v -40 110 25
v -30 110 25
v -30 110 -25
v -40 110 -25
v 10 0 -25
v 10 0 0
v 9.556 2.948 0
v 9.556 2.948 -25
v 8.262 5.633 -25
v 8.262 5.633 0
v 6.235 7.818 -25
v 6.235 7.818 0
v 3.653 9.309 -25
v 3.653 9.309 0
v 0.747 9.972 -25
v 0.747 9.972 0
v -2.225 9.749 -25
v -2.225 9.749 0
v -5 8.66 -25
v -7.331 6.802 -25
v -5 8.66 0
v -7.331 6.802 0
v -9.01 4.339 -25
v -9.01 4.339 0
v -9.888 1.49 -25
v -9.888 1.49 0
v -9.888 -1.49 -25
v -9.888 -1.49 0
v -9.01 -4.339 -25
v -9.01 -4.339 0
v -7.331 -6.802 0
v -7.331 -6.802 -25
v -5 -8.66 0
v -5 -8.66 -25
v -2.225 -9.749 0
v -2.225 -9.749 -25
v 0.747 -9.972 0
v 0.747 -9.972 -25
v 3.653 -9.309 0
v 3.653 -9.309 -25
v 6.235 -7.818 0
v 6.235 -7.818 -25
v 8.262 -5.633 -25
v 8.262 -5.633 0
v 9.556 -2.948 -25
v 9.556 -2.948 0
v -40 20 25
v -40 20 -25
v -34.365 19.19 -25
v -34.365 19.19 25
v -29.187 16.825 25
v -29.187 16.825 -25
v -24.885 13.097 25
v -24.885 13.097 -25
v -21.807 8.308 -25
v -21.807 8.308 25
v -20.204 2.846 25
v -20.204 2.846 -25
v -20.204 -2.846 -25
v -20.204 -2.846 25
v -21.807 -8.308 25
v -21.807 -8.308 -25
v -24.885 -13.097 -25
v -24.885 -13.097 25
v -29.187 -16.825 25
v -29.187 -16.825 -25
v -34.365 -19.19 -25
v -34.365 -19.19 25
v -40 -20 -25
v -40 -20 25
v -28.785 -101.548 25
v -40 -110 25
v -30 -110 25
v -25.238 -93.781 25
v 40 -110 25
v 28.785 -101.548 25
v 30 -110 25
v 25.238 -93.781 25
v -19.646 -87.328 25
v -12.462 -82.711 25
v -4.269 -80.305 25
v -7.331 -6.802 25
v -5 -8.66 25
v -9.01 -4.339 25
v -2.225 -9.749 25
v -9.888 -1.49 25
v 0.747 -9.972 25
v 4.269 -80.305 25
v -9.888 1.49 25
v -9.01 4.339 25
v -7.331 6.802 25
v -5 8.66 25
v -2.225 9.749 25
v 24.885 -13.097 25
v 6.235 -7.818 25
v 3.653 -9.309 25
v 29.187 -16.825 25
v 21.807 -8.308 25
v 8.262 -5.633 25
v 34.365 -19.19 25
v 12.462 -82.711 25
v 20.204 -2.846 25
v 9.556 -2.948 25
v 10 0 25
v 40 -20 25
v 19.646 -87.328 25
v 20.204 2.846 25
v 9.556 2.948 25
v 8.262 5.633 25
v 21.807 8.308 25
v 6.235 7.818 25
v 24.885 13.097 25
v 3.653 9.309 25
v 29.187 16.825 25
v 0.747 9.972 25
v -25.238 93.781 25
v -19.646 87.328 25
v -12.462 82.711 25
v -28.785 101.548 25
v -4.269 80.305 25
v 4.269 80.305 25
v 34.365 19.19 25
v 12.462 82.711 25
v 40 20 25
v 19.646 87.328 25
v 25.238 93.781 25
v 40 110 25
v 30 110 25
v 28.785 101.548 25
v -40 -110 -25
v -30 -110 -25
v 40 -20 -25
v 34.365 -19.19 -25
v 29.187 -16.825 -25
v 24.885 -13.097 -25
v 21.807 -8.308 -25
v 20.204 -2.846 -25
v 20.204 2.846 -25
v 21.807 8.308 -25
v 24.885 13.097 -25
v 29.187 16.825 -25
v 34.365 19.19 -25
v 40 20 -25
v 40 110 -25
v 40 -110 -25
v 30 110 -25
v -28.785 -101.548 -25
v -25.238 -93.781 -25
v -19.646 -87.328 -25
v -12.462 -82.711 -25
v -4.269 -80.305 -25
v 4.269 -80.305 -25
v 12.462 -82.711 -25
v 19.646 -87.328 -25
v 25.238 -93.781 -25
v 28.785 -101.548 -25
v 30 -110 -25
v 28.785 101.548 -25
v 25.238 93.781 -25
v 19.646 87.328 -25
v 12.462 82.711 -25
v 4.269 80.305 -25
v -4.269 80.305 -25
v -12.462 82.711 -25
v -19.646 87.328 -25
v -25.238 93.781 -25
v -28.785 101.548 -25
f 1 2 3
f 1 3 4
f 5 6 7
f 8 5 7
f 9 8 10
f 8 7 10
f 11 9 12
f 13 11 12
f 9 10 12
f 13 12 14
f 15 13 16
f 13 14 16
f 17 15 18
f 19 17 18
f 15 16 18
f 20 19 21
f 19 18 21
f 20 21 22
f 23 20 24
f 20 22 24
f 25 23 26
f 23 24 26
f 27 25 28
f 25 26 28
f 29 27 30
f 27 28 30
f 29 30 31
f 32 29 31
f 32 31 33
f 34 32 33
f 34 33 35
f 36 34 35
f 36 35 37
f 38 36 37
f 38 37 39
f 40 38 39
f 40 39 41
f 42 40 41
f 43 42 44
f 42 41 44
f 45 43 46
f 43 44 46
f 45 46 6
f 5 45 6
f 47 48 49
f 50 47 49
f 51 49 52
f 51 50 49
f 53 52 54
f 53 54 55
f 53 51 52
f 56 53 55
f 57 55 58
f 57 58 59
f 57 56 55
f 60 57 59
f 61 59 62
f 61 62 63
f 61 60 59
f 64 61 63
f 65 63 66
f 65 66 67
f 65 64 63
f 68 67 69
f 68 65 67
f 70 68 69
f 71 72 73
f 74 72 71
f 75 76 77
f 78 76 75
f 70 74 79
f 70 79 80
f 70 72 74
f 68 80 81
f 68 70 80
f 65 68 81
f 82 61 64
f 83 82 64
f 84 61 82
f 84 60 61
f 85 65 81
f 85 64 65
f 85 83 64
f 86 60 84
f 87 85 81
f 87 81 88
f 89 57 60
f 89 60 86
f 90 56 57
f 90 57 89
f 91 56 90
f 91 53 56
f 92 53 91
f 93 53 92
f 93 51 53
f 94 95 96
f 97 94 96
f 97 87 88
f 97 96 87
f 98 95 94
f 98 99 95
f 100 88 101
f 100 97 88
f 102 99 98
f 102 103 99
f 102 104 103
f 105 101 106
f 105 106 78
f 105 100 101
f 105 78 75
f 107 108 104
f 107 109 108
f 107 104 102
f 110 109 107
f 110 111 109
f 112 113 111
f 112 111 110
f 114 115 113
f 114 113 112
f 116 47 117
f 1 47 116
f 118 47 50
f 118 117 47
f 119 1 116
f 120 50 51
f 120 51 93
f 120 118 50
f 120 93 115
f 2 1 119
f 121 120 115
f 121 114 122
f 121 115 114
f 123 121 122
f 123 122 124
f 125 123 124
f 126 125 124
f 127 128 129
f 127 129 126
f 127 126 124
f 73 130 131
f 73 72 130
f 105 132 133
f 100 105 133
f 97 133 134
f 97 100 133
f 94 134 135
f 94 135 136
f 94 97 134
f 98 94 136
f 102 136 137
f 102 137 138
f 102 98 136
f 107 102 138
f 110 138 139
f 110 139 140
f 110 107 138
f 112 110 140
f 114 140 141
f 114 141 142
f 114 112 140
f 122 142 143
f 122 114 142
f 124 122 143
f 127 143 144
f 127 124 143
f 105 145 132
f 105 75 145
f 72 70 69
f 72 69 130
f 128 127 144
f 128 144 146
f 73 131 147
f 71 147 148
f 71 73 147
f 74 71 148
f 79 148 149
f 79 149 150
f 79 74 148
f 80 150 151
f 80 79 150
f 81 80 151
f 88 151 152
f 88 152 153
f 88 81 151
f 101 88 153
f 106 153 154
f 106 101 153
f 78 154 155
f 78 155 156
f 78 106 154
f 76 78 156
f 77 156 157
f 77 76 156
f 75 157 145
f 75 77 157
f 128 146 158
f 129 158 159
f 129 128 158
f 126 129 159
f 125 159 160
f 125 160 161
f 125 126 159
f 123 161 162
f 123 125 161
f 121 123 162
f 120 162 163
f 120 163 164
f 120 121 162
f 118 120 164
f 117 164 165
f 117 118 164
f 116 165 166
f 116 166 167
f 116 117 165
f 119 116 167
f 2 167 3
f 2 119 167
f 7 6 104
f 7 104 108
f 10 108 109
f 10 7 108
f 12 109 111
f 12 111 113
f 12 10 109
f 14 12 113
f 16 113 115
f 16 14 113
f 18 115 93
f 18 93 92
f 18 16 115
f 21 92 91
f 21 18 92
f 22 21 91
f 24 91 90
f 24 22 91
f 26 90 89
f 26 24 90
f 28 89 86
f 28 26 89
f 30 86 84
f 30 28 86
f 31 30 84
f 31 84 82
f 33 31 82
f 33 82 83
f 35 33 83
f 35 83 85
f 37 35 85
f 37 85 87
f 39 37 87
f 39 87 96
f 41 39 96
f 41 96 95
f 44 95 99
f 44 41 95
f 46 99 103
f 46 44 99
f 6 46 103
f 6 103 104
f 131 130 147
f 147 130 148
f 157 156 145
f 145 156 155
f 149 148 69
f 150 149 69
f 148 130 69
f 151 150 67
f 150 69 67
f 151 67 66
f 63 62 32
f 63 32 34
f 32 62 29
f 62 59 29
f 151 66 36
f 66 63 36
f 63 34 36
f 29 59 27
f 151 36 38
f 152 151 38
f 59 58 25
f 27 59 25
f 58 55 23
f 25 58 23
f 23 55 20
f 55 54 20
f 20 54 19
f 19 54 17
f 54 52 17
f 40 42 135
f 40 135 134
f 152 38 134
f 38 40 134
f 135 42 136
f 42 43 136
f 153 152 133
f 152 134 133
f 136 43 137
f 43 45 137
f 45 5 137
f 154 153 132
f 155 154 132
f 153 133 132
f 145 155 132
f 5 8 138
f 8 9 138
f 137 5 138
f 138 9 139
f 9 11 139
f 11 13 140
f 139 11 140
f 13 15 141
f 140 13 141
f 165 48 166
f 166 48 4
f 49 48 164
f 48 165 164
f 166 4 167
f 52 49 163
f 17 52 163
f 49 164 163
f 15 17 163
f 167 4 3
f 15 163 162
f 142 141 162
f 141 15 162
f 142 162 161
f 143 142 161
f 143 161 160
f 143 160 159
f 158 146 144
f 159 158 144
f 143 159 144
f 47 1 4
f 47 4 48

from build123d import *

# Parameters (mm, degrees)
F0_R          = 10
F1_DEPTH      = 25
F1_DEPTH_BACK = 25


with BuildPart() as f1:
    # F0 (on Top) → F1 (new body, two sides)
    with BuildSketch(Plane.XY) as f1_sk:
        with BuildLine():
            Line((-40, 20), (40, 20))
            Line((40, 20), (40, 110))
            Line((40, 110), (30, 110))
            ThreePointArc((30, 110), (0, 80), (-30, 110))
            Line((-30, 110), (-40, 110))
            Line((-40, 110), (-40, 20))
        make_face()
        with BuildLine():
            Line((30, -110), (40, -110))
            Line((40, -110), (40, -20))
            Line((40, -20), (-40, -20))
            Line((-40, -20), (-40, -110))
            Line((-40, -110), (-30, -110))
            ThreePointArc((-30, -110), (0, -80), (30, -110))
        make_face()
        with BuildLine():
            Line((-40, -20), (40, -20))
            ThreePointArc((40, -20), (20, 0), (40, 20))
            Line((40, 20), (-40, 20))
            ThreePointArc((-40, 20), (-20, 0), (-40, -20))
        make_face()
        Circle(F0_R, mode=Mode.SUBTRACT)
    extrude(amount=F1_DEPTH)
    extrude(f1_sk.sketch, amount=-F1_DEPTH_BACK)


solid = f1.part
